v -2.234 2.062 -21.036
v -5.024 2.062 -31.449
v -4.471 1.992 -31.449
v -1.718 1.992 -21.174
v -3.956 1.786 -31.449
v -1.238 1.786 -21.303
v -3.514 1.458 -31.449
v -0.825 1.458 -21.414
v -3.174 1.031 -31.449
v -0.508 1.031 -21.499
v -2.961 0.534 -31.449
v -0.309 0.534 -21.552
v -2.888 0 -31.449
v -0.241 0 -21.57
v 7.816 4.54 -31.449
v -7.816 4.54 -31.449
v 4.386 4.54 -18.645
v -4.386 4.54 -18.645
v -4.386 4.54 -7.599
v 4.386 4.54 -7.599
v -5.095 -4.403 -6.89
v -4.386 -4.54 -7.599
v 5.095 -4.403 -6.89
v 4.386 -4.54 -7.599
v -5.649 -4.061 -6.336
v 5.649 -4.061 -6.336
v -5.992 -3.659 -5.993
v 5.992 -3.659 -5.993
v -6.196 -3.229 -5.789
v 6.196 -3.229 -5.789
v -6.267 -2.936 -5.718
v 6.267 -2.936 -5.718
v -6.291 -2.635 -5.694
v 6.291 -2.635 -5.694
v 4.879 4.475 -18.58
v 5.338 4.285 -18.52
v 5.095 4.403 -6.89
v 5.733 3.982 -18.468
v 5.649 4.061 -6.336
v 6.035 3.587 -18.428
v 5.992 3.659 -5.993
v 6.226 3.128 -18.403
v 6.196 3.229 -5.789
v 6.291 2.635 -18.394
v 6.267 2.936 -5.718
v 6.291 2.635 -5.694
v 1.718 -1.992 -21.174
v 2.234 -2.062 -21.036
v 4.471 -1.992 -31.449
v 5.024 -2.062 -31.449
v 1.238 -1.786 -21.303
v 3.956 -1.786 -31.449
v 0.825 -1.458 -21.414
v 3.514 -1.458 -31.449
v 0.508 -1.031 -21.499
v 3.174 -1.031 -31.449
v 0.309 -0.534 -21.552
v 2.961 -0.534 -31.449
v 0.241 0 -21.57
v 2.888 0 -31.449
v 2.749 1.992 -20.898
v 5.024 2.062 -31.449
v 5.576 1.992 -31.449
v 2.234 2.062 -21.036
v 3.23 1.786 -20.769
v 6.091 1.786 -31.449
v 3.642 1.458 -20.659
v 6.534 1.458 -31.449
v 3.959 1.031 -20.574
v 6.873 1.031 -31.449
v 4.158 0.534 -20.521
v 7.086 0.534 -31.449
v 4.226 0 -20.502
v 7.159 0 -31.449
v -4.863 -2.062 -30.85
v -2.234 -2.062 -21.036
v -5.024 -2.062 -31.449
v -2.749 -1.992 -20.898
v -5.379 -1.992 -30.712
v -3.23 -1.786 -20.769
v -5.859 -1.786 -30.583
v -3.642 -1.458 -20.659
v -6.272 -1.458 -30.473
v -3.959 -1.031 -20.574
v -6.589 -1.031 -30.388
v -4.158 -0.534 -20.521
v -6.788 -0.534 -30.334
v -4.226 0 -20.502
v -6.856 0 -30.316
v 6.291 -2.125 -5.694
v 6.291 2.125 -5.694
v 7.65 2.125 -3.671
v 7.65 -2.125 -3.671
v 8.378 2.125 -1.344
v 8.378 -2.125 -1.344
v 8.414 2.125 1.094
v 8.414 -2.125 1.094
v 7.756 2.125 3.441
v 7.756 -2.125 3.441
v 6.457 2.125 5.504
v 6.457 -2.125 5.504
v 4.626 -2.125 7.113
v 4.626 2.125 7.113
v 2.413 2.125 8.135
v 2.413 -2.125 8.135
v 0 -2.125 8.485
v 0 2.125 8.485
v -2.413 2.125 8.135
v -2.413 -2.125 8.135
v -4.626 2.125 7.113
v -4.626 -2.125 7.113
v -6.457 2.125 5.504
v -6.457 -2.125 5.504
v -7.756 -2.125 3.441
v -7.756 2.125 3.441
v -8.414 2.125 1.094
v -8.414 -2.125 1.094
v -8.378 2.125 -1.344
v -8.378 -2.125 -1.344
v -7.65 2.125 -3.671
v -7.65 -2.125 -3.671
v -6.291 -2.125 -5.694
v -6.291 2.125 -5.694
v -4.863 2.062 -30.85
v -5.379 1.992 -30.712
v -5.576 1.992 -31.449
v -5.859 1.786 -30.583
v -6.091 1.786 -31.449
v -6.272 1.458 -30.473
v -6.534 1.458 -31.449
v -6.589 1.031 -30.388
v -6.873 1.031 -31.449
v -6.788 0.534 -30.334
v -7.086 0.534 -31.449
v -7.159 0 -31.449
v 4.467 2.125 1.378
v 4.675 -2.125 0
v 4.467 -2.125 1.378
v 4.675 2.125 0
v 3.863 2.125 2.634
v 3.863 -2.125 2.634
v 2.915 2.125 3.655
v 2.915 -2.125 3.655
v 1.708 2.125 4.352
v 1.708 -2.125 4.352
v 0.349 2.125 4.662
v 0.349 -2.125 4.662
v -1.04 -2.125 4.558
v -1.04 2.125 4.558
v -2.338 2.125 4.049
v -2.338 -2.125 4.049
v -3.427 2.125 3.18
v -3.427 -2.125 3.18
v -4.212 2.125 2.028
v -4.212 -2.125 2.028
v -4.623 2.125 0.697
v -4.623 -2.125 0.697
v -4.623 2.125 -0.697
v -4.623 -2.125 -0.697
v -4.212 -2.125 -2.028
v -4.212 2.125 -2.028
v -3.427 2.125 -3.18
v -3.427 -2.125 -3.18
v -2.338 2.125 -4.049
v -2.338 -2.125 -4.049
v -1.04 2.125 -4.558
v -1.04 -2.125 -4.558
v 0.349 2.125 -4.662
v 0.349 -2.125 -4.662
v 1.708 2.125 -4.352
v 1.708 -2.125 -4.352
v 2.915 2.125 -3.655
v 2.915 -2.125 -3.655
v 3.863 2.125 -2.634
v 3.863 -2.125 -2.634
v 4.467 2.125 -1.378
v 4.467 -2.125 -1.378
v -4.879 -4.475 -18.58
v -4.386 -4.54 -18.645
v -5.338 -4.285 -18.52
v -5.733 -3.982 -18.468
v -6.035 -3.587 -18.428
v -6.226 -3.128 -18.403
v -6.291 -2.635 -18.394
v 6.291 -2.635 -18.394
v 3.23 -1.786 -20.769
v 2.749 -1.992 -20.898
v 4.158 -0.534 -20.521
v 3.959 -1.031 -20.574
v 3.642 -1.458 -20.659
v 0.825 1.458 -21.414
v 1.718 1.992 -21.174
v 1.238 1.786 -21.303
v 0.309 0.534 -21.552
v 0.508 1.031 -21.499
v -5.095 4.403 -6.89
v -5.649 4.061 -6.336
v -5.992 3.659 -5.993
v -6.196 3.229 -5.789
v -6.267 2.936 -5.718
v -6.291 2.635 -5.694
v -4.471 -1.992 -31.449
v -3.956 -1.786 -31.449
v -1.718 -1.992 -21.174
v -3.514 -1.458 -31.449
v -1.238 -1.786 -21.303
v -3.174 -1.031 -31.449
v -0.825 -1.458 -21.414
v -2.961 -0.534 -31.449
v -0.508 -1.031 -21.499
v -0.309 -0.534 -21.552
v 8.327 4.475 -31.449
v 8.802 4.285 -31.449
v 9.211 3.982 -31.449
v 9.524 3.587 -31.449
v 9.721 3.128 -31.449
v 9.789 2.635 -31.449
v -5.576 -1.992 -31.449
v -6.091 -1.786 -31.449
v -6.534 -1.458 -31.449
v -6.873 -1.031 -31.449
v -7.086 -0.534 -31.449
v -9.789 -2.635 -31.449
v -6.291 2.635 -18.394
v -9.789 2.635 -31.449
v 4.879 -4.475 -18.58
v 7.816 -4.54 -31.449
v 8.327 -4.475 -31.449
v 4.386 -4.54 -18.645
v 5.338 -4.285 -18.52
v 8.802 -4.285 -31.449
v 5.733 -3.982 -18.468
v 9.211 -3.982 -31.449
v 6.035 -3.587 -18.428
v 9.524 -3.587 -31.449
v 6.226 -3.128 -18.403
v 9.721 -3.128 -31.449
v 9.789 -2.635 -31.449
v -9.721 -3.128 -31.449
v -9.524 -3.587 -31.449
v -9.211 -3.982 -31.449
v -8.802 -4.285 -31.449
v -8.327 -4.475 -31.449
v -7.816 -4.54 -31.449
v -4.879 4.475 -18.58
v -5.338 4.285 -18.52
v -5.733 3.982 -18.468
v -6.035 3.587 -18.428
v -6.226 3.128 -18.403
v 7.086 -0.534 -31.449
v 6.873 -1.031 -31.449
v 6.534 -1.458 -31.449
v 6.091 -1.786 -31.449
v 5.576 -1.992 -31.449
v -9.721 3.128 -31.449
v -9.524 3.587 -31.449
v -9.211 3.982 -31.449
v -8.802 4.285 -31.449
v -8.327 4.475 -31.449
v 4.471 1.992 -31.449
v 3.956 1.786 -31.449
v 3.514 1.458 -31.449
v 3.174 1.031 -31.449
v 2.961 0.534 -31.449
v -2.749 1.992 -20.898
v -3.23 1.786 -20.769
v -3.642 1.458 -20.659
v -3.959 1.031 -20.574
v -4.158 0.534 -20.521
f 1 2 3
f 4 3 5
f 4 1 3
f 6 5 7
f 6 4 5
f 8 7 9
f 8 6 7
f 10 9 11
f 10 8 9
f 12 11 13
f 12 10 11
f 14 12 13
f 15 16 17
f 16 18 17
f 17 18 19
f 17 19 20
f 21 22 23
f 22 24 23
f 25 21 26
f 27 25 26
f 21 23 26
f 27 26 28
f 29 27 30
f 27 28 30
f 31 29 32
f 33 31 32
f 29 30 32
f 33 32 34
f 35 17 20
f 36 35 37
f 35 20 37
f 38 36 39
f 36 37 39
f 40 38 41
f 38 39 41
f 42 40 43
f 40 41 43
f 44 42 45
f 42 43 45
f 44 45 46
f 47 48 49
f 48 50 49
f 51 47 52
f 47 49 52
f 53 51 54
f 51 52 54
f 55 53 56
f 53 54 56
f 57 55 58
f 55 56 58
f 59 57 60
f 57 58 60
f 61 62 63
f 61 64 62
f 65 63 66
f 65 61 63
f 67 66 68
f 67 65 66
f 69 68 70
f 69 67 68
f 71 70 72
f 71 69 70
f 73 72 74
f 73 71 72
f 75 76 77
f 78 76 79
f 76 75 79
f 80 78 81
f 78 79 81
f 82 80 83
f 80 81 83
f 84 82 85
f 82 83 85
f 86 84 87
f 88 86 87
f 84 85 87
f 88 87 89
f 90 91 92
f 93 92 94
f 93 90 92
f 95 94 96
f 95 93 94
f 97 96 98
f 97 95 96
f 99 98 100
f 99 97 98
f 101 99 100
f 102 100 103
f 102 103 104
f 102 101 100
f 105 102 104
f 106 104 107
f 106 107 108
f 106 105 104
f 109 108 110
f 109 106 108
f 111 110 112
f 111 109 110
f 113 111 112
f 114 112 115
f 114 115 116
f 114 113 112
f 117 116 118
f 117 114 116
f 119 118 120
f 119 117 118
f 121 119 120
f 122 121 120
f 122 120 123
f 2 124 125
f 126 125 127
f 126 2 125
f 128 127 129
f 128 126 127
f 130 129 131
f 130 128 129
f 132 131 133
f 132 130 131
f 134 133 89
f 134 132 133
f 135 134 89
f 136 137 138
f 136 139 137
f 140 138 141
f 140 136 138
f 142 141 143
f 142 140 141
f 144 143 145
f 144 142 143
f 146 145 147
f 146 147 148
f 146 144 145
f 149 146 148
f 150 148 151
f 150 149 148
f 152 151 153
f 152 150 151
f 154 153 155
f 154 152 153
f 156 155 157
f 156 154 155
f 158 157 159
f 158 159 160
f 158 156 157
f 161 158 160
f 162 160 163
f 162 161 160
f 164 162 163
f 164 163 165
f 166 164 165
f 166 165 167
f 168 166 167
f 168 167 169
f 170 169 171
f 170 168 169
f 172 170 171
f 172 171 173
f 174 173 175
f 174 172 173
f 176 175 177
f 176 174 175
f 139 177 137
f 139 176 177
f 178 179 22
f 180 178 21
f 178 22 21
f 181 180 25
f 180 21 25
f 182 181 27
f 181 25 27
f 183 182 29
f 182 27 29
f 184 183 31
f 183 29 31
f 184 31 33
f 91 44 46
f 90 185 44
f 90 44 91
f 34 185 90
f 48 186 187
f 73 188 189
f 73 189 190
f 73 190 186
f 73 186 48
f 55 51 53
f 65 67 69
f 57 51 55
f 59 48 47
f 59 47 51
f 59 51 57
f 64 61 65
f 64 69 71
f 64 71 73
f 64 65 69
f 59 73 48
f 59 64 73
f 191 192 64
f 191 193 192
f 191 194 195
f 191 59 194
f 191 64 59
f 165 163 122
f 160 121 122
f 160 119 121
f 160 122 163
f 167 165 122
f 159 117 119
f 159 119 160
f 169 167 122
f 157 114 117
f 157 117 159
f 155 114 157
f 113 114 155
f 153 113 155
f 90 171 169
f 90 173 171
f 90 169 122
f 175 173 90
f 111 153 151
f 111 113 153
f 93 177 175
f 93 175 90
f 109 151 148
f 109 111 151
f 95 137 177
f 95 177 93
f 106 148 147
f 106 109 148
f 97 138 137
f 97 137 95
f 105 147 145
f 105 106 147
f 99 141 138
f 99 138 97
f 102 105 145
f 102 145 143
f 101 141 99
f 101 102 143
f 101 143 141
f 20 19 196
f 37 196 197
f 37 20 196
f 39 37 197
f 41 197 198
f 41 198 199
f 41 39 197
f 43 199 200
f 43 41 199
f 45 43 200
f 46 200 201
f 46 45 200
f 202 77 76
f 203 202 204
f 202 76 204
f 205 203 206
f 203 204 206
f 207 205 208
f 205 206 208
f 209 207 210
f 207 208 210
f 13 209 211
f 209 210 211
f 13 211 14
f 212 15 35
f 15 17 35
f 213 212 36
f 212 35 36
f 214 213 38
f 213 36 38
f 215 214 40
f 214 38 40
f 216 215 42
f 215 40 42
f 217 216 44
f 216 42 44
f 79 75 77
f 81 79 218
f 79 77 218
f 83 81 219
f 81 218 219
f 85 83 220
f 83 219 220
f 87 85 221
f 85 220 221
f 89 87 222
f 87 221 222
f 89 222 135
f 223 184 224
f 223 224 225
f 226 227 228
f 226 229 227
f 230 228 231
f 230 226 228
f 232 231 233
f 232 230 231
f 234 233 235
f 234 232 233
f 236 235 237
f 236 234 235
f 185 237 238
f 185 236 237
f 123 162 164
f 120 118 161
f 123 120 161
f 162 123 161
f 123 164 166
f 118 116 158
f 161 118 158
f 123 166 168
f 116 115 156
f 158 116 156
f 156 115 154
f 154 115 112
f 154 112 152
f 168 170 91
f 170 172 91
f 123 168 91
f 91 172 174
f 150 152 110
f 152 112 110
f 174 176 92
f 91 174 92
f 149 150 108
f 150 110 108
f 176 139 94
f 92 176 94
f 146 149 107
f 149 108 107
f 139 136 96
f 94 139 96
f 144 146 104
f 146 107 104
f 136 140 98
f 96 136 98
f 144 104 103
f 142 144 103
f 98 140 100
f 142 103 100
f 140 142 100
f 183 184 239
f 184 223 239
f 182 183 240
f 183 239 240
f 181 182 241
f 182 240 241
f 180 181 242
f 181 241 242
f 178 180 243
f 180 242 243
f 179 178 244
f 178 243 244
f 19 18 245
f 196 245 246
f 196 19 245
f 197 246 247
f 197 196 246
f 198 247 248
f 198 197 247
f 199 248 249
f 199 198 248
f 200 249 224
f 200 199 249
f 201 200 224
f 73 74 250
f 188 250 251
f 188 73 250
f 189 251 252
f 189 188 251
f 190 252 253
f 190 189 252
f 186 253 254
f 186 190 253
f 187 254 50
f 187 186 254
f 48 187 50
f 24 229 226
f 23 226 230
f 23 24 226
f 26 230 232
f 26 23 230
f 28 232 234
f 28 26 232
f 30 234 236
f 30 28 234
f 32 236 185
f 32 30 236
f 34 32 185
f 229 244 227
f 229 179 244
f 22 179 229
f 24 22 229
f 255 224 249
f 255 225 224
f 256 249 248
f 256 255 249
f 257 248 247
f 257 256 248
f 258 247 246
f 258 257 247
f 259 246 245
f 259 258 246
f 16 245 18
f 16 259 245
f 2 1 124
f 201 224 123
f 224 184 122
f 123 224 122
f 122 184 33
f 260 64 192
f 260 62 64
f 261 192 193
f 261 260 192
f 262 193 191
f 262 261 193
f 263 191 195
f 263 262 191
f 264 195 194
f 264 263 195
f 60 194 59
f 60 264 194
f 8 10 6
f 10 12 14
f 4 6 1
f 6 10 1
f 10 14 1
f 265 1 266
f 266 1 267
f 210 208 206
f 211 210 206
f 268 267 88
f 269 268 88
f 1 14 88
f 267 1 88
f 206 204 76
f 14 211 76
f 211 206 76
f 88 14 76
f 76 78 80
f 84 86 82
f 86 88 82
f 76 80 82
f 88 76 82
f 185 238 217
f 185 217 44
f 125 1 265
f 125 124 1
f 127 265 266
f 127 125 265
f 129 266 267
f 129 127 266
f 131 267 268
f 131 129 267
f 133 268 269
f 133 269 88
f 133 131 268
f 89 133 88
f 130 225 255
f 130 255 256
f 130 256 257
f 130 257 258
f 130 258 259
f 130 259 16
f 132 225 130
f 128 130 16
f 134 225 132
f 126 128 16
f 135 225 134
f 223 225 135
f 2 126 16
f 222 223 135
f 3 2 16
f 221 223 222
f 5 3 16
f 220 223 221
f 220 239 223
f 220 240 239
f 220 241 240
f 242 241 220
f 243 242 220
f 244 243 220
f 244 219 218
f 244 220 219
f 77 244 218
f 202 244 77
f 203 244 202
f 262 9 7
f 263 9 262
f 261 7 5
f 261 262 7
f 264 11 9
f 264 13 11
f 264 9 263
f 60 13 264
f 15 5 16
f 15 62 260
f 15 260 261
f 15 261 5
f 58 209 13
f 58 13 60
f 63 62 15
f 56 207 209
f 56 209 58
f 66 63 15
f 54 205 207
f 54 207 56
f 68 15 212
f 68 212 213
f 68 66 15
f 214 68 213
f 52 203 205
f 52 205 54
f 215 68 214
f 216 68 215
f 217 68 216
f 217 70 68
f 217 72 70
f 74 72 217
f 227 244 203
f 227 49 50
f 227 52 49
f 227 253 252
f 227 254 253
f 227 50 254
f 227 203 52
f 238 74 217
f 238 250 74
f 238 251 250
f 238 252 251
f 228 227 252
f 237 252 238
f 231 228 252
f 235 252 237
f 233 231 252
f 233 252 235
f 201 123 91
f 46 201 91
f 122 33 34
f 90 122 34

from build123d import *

# Parameters (mm, degrees)
F0_R     = 8.485
F0_R_2   = 4.675
F1_DEPTH = 2.125
F2_W     = 12.5812107759
F2_H     = 12.7
F3_DEPTH = 4.539996
F5_DEPTH = 2.0625
F6_R     = 2.06249
F7_R     = 1.905


# Not quite as in the source:
# - a fillet or chamfer is up to 0.001 mm smaller than in the source, because OpenCascade refuses the exact size


with BuildPart() as f1:
    # F0 (on Front) → F1 (new body, symmetric)
    with BuildSketch(Plane.XZ):
        Circle(F0_R)
        Circle(F0_R_2, mode=Mode.SUBTRACT)
    extrude(amount=F1_DEPTH, both=True)

    # F2 (on Front) → F3 (join, symmetric)
    with BuildSketch(Plane.XZ):
        Polygon((-6.2906053879, -18.3941644561), (-9.7885362858, -31.4486202883), (9.7885362858, -31.4486202883), (6.2906053879, -18.3941644561), align=None)
        with Locations((0, -12.0441644561)):
            Rectangle(F2_W, F2_H)
    extrude(amount=F3_DEPTH, both=True)

    # F4 (on Front) → F5 (cut, symmetric)
    with BuildSketch(Plane.XZ):
        Polygon((4.22592549, -20.5024805709), (0.2414814566, -21.5701091319), (2.8884205433, -31.4486202883), (7.1589347875, -31.4486202883), align=None)
        Polygon((-0.2414814566, -21.5701091319), (-4.22592549, -20.5024805709), (-6.8555269883, -30.3162869659), (-7.1589347875, -31.4486202883), (-2.8884205433, -31.4486202883), align=None)
    extrude(amount=F5_DEPTH, both=True, mode=Mode.SUBTRACT)

    # F6 (radius 2.0625 in the source; OpenCascade refuses exactly that, so slightly less here)
    f6_edges = [f1.edges().sort_by_distance(p)[0] for p in [
        (-5.69243, -2.0625, -25.97555),
        (1.564951, -2.0625, -26.509365),
        (5.69243, -2.0625, -25.97555),
        (-1.564951, -2.0625, -26.509365),
        (5.69243, 2.0625, -25.97555),
        (-1.564951, 2.0625, -26.509365),
        (-5.69243, 2.0625, -25.97555),
        (1.564951, 2.0625, -26.509365),
    ]]
    fillet(f6_edges, radius=F6_R)

    # F7
    f7_edges = [f1.edges().sort_by_distance(p)[0] for p in [
        (-8.039571, -4.539996, -24.921392),
        (-6.290605, -4.539996, -12.044164),
        (-6.290605, 4.539996, -12.044164),
        (-8.039571, 4.539996, -24.921392),
        (8.039571, -4.539996, -24.921392),
        (6.290605, -4.539996, -12.044164),
        (8.039571, 4.539996, -24.921392),
        (6.290605, 4.539996, -12.044164),
        (0, 4.539996, -5.694164),
        (0, -4.539996, -5.694164),
    ]]
    fillet(f7_edges, radius=F7_R)


solid = f1.part
